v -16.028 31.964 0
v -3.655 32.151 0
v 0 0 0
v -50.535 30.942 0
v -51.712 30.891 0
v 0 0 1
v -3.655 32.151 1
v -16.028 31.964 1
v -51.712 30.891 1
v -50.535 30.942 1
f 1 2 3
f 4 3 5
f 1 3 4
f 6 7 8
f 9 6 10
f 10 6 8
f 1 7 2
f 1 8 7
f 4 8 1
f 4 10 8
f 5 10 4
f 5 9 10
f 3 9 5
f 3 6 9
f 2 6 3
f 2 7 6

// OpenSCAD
// Generated by SolidPython 1.1.3 on 2024-05-19 23:35:49


linear_extrude(height = 1) {
	polygon(points = [[0, 0], [-3.6552031250, 32.1512988281], [-3.7123750000, 32.1504343750], [-3.7695468750, 32.1495699219], [-3.8267187500, 32.1487054688], [-3.8838906250, 32.1478410156], [-3.9410625000, 32.1469765625], [-3.9982343750, 32.1461121094], [-4.0554062500, 32.1452476562], [-4.1125781250, 32.1443832031], [-4.1697500000, 32.1435187500], [-4.2269218750, 32.1426542969], [-4.2840937500, 32.1417898437], [-4.3412656250, 32.1409253906], [-4.3984375000, 32.1400609375], [-4.4556093750, 32.1391964844], [-4.5127812500, 32.1383320313], [-4.5699531250, 32.1374675781], [-4.6271250000, 32.1366031250], [-4.6842968750, 32.1357386719], [-4.7414687500, 32.1348742187], [-4.7986406250, 32.1340097656], [-4.8558125000, 32.1331453125], [-4.9129843750, 32.1322808594], [-4.9701562500, 32.1314164063], [-5.0273281250, 32.1305519531], [-5.0845000000, 32.1296875000], [-5.1416718750, 32.1288230469], [-5.1988437500, 32.1279585938], [-5.2560156250, 32.1270941406], [-5.3131875000, 32.1262296875], [-5.3703593750, 32.1253652344], [-5.4275312500, 32.1245007812], [-5.4847031250, 32.1236363281], [-5.5418750000, 32.1227718750], [-5.5990468750, 32.1219074219], [-5.6562187500, 32.1210429687], [-5.7133906250, 32.1201785156], [-5.7705625000, 32.1193140625], [-5.8277343750, 32.1184496094], [-5.8849062500, 32.1175851563], [-5.9420781250, 32.1167207031], [-5.9992500000, 32.1158562500], [-6.0564218750, 32.1149917969], [-6.1135937500, 32.1141273437], [-6.1707656250, 32.1132628906], [-6.2279375000, 32.1123984375], [-6.2851093750, 32.1115339844], [-6.3422812500, 32.1106695313], [-6.3994531250, 32.1098050781], [-6.4566250000, 32.1089406250], [-6.5137968750, 32.1080761719], [-6.5709687500, 32.1072117188], [-6.6281406250, 32.1063472656], [-6.6853125000, 32.1054828125], [-6.7424843750, 32.1046183594], [-6.7996562500, 32.1037539062], [-6.8568281250, 32.1028894531], [-6.9140000000, 32.1020250000], [-6.9711718750, 32.1011605469], [-7.0283437500, 32.1002960937], [-7.0855156250, 32.0994316406], [-7.1426875000, 32.0985671875], [-7.1998593750, 32.0977027344], [-7.2570312500, 32.0968382813], [-7.3142031250, 32.0959738281], [-7.3713750000, 32.0951093750], [-7.4285468750, 32.0942449219], [-7.4857187500, 32.0933804687], [-7.5428906250, 32.0925160156], [-7.6000625000, 32.0916515625], [-7.6572343750, 32.0907871094], [-7.7144062500, 32.0899226563], [-7.7715781250, 32.0890582031], [-7.8287500000, 32.0881937500], [-7.8859218750, 32.0873292969], [-7.9430937500, 32.0864648438], [-8.0002656250, 32.0856003906], [-8.0574375000, 32.0847359375], [-8.1146093750, 32.0838714844], [-8.1717812500, 32.0830070312], [-8.2289531250, 32.0821425781], [-8.2861250000, 32.0812781250], [-8.3432968750, 32.0804136719], [-8.4004687500, 32.0795492187], [-8.4576406250, 32.0786847656], [-8.5148125000, 32.0778203125], [-8.5719843750, 32.0769558594], [-8.6291562500, 32.0760914063], [-8.6863281250, 32.0752269531], [-8.7435000000, 32.0743625000], [-8.8006718750, 32.0734980469], [-8.8578437500, 32.0726335937], [-8.9150156250, 32.0717691406], [-8.9721875000, 32.0709046875], [-9.0293593750, 32.0700402344], [-9.0865312500, 32.0691757813], [-9.1437031250, 32.0683113281], [-9.2008750000, 32.0674468750], [-9.2580468750, 32.0665824219], [-9.3152187500, 32.0657179688], [-9.3723906250, 32.0648535156], [-9.4295625000, 32.0639890625], [-9.4867343750, 32.0631246094], [-9.5439062500, 32.0622601562], [-9.6010781250, 32.0613957031], [-9.6582500000, 32.0605312500], [-9.7154218750, 32.0596667969], [-9.7725937500, 32.0588023437], [-9.8297656250, 32.0579378906], [-9.8869375000, 32.0570734375], [-9.9441093750, 32.0562089844], [-10.0012812500, 32.0553445313], [-10.0584531250, 32.0544800781], [-10.1156250000, 32.0536156250], [-10.1727968750, 32.0527511719], [-10.2299687500, 32.0518867187], [-10.2871406250, 32.0510222656], [-10.3443125000, 32.0501578125], [-10.4014843750, 32.0492933594], [-10.4586562500, 32.0484289063], [-10.5158281250, 32.0475644531], [-10.5730000000, 32.0467000000], [-10.6582312500, 32.0454109375], [-10.7434625000, 32.0441218750], [-10.8286937500, 32.0428328125], [-10.9139250000, 32.0415437500], [-10.9991562500, 32.0402546875], [-11.0843875000, 32.0389656250], [-11.1696187500, 32.0376765625], [-11.2548500000, 32.0363875000], [-11.3400812500, 32.0350984375], [-11.4253125000, 32.0338093750], [-11.5105437500, 32.0325203125], [-11.5957750000, 32.0312312500], [-11.6810062500, 32.0299421875], [-11.7662375000, 32.0286531250], [-11.8514687500, 32.0273640625], [-11.9367000000, 32.0260750000], [-12.0219312500, 32.0247859375], [-12.1071625000, 32.0234968750], [-12.1923937500, 32.0222078125], [-12.2776250000, 32.0209187500], [-12.3628562500, 32.0196296875], [-12.4480875000, 32.0183406250], [-12.5333187500, 32.0170515625], [-12.6185500000, 32.0157625000], [-12.7037812500, 32.0144734375], [-12.7890125000, 32.0131843750], [-12.8742437500, 32.0118953125], [-12.9594750000, 32.0106062500], [-13.0447062500, 32.0093171875], [-13.1299375000, 32.0080281250], [-13.2151687500, 32.0067390625], [-13.3004000000, 32.0054500000], [-13.3856312500, 32.0041609375], [-13.4708625000, 32.0028718750], [-13.5560937500, 32.0015828125], [-13.6413250000, 32.0002937500], [-13.7265562500, 31.9990046875], [-13.8117875000, 31.9977156250], [-13.8970187500, 31.9964265625], [-13.9822500000, 31.9951375000], [-14.0674812500, 31.9938484375], [-14.1527125000, 31.9925593750], [-14.2379437500, 31.9912703125], [-14.3231750000, 31.9899812500], [-14.4084062500, 31.9886921875], [-14.4936375000, 31.9874031250], [-14.5788687500, 31.9861140625], [-14.6641000000, 31.9848250000], [-14.7493312500, 31.9835359375], [-14.8345625000, 31.9822468750], [-14.9197937500, 31.9809578125], [-15.0050250000, 31.9796687500], [-15.0902562500, 31.9783796875], [-15.1754875000, 31.9770906250], [-15.2607187500, 31.9758015625], [-15.3459500000, 31.9745125000], [-15.4311812500, 31.9732234375], [-15.5164125000, 31.9719343750], [-15.6016437500, 31.9706453125], [-15.6868750000, 31.9693562500], [-15.7721062500, 31.9680671875], [-15.8573375000, 31.9667781250], [-15.9425687500, 31.9654890625], [-16.0278000000, 31.9642000000], [-16.1260382812, 31.9612898438], [-16.2242765625, 31.9583796875], [-16.3225148437, 31.9554695312], [-16.4207531250, 31.9525593750], [-16.5189914062, 31.9496492188], [-16.6172296875, 31.9467390625], [-16.7154679687, 31.9438289063], [-16.8137062500, 31.9409187500], [-16.9119445313, 31.9380085938], [-17.0101828125, 31.9350984375], [-17.1084210937, 31.9321882813], [-17.2066593750, 31.9292781250], [-17.3048976562, 31.9263679688], [-17.4031359375, 31.9234578125], [-17.5013742188, 31.9205476563], [-17.5996125000, 31.9176375000], [-17.6978507812, 31.9147273438], [-17.7960890625, 31.9118171875], [-17.8943273437, 31.9089070313], [-17.9925656250, 31.9059968750], [-18.0908039062, 31.9030867188], [-18.1890421875, 31.9001765625], [-18.2872804687, 31.8972664063], [-18.3855187500, 31.8943562500], [-18.4837570313, 31.8914460938], [-18.5819953125, 31.8885359375], [-18.6802335937, 31.8856257813], [-18.7784718750, 31.8827156250], [-18.8767101562, 31.8798054688], [-18.9749484375, 31.8768953125], [-19.0731867188, 31.8739851563], [-19.1714250000, 31.8710750000], [-19.2696632812, 31.8681648438], [-19.3679015625, 31.8652546875], [-19.4661398437, 31.8623445313], [-19.5643781250, 31.8594343750], [-19.6626164062, 31.8565242188], [-19.7608546875, 31.8536140625], [-19.8590929687, 31.8507039063], [-19.9573312500, 31.8477937500], [-20.0555695313, 31.8448835938], [-20.1538078125, 31.8419734375], [-20.2520460937, 31.8390632813], [-20.3502843750, 31.8361531250], [-20.4485226562, 31.8332429688], [-20.5467609375, 31.8303328125], [-20.6449992188, 31.8274226563], [-20.7432375000, 31.8245125000], [-20.8414757812, 31.8216023438], [-20.9397140625, 31.8186921875], [-21.0379523437, 31.8157820313], [-21.1361906250, 31.8128718750], [-21.2344289062, 31.8099617188], [-21.3326671875, 31.8070515625], [-21.4309054687, 31.8041414063], [-21.5291437500, 31.8012312500], [-21.6273820313, 31.7983210938], [-21.7256203125, 31.7954109375], [-21.8238585937, 31.7925007813], [-21.9220968750, 31.7895906250], [-22.0203351562, 31.7866804688], [-22.1185734375, 31.7837703125], [-22.2168117188, 31.7808601563], [-22.3150500000, 31.7779500000], [-22.4132882812, 31.7750398438], [-22.5115265625, 31.7721296875], [-22.6097648437, 31.7692195313], [-22.7080031250, 31.7663093750], [-22.8062414062, 31.7633992188], [-22.9044796875, 31.7604890625], [-23.0027179687, 31.7575789063], [-23.1009562500, 31.7546687500], [-23.1991945313, 31.7517585938], [-23.2974328125, 31.7488484375], [-23.3956710937, 31.7459382813], [-23.4939093750, 31.7430281250], [-23.5921476562, 31.7401179688], [-23.6903859375, 31.7372078125], [-23.7886242188, 31.7342976563], [-23.8868625000, 31.7313875000], [-23.9851007812, 31.7284773438], [-24.0833390625, 31.7255671875], [-24.1815773437, 31.7226570313], [-24.2798156250, 31.7197468750], [-24.3780539062, 31.7168367188], [-24.4762921875, 31.7139265625], [-24.5745304687, 31.7110164063], [-24.6727687500, 31.7081062500], [-24.7710070313, 31.7051960938], [-24.8692453125, 31.7022859375], [-24.9674835937, 31.6993757813], [-25.0657218750, 31.6964656250], [-25.1639601562, 31.6935554688], [-25.2621984375, 31.6906453125], [-25.3604367188, 31.6877351563], [-25.4586750000, 31.6848250000], [-25.5569132812, 31.6819148438], [-25.6551515625, 31.6790046875], [-25.7533898437, 31.6760945313], [-25.8516281250, 31.6731843750], [-25.9498664062, 31.6702742188], [-26.0481046875, 31.6673640625], [-26.1463429687, 31.6644539063], [-26.2445812500, 31.6615437500], [-26.3428195313, 31.6586335938], [-26.4410578125, 31.6557234375], [-26.5392960937, 31.6528132813], [-26.6375343750, 31.6499031250], [-26.7357726562, 31.6469929688], [-26.8340109375, 31.6440828125], [-26.9322492188, 31.6411726563], [-27.0304875000, 31.6382625000], [-27.1287257812, 31.6353523438], [-27.2269640625, 31.6324421875], [-27.3252023438, 31.6295320313], [-27.4234406250, 31.6266218750], [-27.5216789062, 31.6237117188], [-27.6199171875, 31.6208015625], [-27.7181554687, 31.6178914063], [-27.8163937500, 31.6149812500], [-27.9146320313, 31.6120710938], [-28.0128703125, 31.6091609375], [-28.1111085938, 31.6062507813], [-28.2093468750, 31.6033406250], [-28.3075851562, 31.6004304688], [-28.4058234375, 31.5975203125], [-28.5040617188, 31.5946101563], [-28.6023000000, 31.5917000000], [-28.7005382812, 31.5887898438], [-28.7987765625, 31.5858796875], [-28.8970148438, 31.5829695313], [-28.9952531250, 31.5800593750], [-29.0934914062, 31.5771492188], [-29.1917296875, 31.5742390625], [-29.2899679687, 31.5713289063], [-29.3882062500, 31.5684187500], [-29.4864445313, 31.5655085938], [-29.5846828125, 31.5625984375], [-29.6829210938, 31.5596882813], [-29.7811593750, 31.5567781250], [-29.8793976562, 31.5538679688], [-29.9776359375, 31.5509578125], [-30.0758742188, 31.5480476563], [-30.1741125000, 31.5451375000], [-30.2723507812, 31.5422273438], [-30.3705890625, 31.5393171875], [-30.4688273438, 31.5364070313], [-30.5670656250, 31.5334968750], [-30.6653039062, 31.5305867188], [-30.7635421875, 31.5276765625], [-30.8617804687, 31.5247664063], [-30.9600187500, 31.5218562500], [-31.0582570313, 31.5189460938], [-31.1564953125, 31.5160359375], [-31.2547335938, 31.5131257813], [-31.3529718750, 31.5102156250], [-31.4512101562, 31.5073054688], [-31.5494484375, 31.5043953125], [-31.6476867188, 31.5014851563], [-31.7459250000, 31.4985750000], [-31.8441632812, 31.4956648438], [-31.9424015625, 31.4927546875], [-32.0406398438, 31.4898445313], [-32.1388781250, 31.4869343750], [-32.2371164062, 31.4840242188], [-32.3353546875, 31.4811140625], [-32.4335929687, 31.4782039063], [-32.5318312500, 31.4752937500], [-32.6300695313, 31.4723835938], [-32.7283078125, 31.4694734375], [-32.8265460937, 31.4665632813], [-32.9247843750, 31.4636531250], [-33.0230226562, 31.4607429688], [-33.1212609375, 31.4578328125], [-33.2194992188, 31.4549226563], [-33.3177375000, 31.4520125000], [-33.4159757812, 31.4491023438], [-33.5142140625, 31.4461921875], [-33.6124523438, 31.4432820313], [-33.7106906250, 31.4403718750], [-33.8089289063, 31.4374617188], [-33.9071671875, 31.4345515625], [-34.0054054687, 31.4316414063], [-34.1036437500, 31.4287312500], [-34.2018820313, 31.4258210938], [-34.3001203125, 31.4229109375], [-34.3983585938, 31.4200007812], [-34.4965968750, 31.4170906250], [-34.5948351562, 31.4141804688], [-34.6930734375, 31.4112703125], [-34.7913117188, 31.4083601563], [-34.8895500000, 31.4054500000], [-34.9877882812, 31.4025398438], [-35.0860265625, 31.3996296875], [-35.1842648438, 31.3967195313], [-35.2825031250, 31.3938093750], [-35.3807414062, 31.3908992188], [-35.4789796875, 31.3879890625], [-35.5772179687, 31.3850789063], [-35.6754562500, 31.3821687500], [-35.7736945313, 31.3792585938], [-35.8719328125, 31.3763484375], [-35.9701710937, 31.3734382812], [-36.0684093750, 31.3705281250], [-36.1666476562, 31.3676179688], [-36.2648859375, 31.3647078125], [-36.3631242188, 31.3617976563], [-36.4613625000, 31.3588875000], [-36.5596007812, 31.3559773438], [-36.6578390625, 31.3530671875], [-36.7560773438, 31.3501570313], [-36.8543156250, 31.3472468750], [-36.9525539063, 31.3443367188], [-37.0507921875, 31.3414265625], [-37.1490304687, 31.3385164063], [-37.2472687500, 31.3356062500], [-37.3455070313, 31.3326960938], [-37.4437453125, 31.3297859375], [-37.5419835938, 31.3268757812], [-37.6402218750, 31.3239656250], [-37.7384601562, 31.3210554688], [-37.8366984375, 31.3181453125], [-37.9349367188, 31.3152351563], [-38.0331750000, 31.3123250000], [-38.1314132812, 31.3094148438], [-38.2296515625, 31.3065046875], [-38.3278898438, 31.3035945313], [-38.4261281250, 31.3006843750], [-38.5243664062, 31.2977742188], [-38.6226046875, 31.2948640625], [-38.7208429687, 31.2919539063], [-38.8190812500, 31.2890437500], [-38.9173195313, 31.2861335938], [-39.0155578125, 31.2832234375], [-39.1137960937, 31.2803132812], [-39.2120343750, 31.2774031250], [-39.3102726562, 31.2744929687], [-39.4085109375, 31.2715828125], [-39.5067492188, 31.2686726563], [-39.6049875000, 31.2657625000], [-39.7032257812, 31.2628523438], [-39.8014640625, 31.2599421875], [-39.8997023438, 31.2570320313], [-39.9979406250, 31.2541218750], [-40.0961789063, 31.2512117188], [-40.1944171875, 31.2483015625], [-40.2926554687, 31.2453914063], [-40.3908937500, 31.2424812500], [-40.4891320313, 31.2395710938], [-40.5873703125, 31.2366609375], [-40.6856085938, 31.2337507812], [-40.7838468750, 31.2308406250], [-40.8820851562, 31.2279304687], [-40.9803234375, 31.2250203125], [-41.0785617188, 31.2221101563], [-41.1768000000, 31.2192000000], [-41.2499085937, 31.2170335938], [-41.3230171875, 31.2148671875], [-41.3961257812, 31.2127007812], [-41.4692343750, 31.2105343750], [-41.5423429687, 31.2083679688], [-41.6154515625, 31.2062015625], [-41.6885601562, 31.2040351563], [-41.7616687500, 31.2018687500], [-41.8347773437, 31.1997023438], [-41.9078859375, 31.1975359375], [-41.9809945312, 31.1953695313], [-42.0541031250, 31.1932031250], [-42.1272117187, 31.1910367188], [-42.2003203125, 31.1888703125], [-42.2734289062, 31.1867039063], [-42.3465375000, 31.1845375000], [-42.4196460937, 31.1823710937], [-42.4927546875, 31.1802046875], [-42.5658632812, 31.1780382813], [-42.6389718750, 31.1758718750], [-42.7120804687, 31.1737054688], [-42.7851890625, 31.1715390625], [-42.8582976562, 31.1693726562], [-42.9314062500, 31.1672062500], [-43.0045148437, 31.1650398438], [-43.0776234375, 31.1628734375], [-43.1507320312, 31.1607070312], [-43.2238406250, 31.1585406250], [-43.2969492187, 31.1563742188], [-43.3700578125, 31.1542078125], [-43.4431664063, 31.1520414062], [-43.5162750000, 31.1498750000], [-43.5893835938, 31.1477085938], [-43.6624921875, 31.1455421875], [-43.7356007813, 31.1433757813], [-43.8087093750, 31.1412093750], [-43.8818179688, 31.1390429688], [-43.9549265625, 31.1368765625], [-44.0280351563, 31.1347101563], [-44.1011437500, 31.1325437500], [-44.1742523438, 31.1303773438], [-44.2473609375, 31.1282109375], [-44.3204695313, 31.1260445313], [-44.3935781250, 31.1238781250], [-44.4666867188, 31.1217117188], [-44.5397953125, 31.1195453125], [-44.6129039063, 31.1173789063], [-44.6860125000, 31.1152125000], [-44.7591210938, 31.1130460938], [-44.8322296875, 31.1108796875], [-44.9053382813, 31.1087132813], [-44.9784468750, 31.1065468750], [-45.0515554688, 31.1043804688], [-45.1246640625, 31.1022140625], [-45.1977726563, 31.1000476562], [-45.2708812500, 31.0978812500], [-45.3439898438, 31.0957148438], [-45.4170984375, 31.0935484375], [-45.4902070313, 31.0913820312], [-45.5633156250, 31.0892156250], [-45.6364242188, 31.0870492188], [-45.7095328125, 31.0848828125], [-45.7826414063, 31.0827164063], [-45.8557500000, 31.0805500000], [-45.9288585938, 31.0783835938], [-46.0019671875, 31.0762171875], [-46.0750757812, 31.0740507813], [-46.1481843750, 31.0718843750], [-46.2212929687, 31.0697179688], [-46.2944015625, 31.0675515625], [-46.3675101562, 31.0653851563], [-46.4406187500, 31.0632187500], [-46.5137273437, 31.0610523438], [-46.5868359375, 31.0588859375], [-46.6599445312, 31.0567195313], [-46.7330531250, 31.0545531250], [-46.8061617187, 31.0523867188], [-46.8792703125, 31.0502203125], [-46.9523789062, 31.0480539063], [-47.0254875000, 31.0458875000], [-47.0985960937, 31.0437210938], [-47.1717046875, 31.0415546875], [-47.2448132812, 31.0393882813], [-47.3179218750, 31.0372218750], [-47.3910304687, 31.0350554688], [-47.4641390625, 31.0328890625], [-47.5372476562, 31.0307226562], [-47.6103562500, 31.0285562500], [-47.6834648437, 31.0263898438], [-47.7565734375, 31.0242234375], [-47.8296820312, 31.0220570313], [-47.9027906250, 31.0198906250], [-47.9758992187, 31.0177242188], [-48.0490078125, 31.0155578125], [-48.1221164063, 31.0133914063], [-48.1952250000, 31.0112250000], [-48.2683335938, 31.0090585938], [-48.3414421875, 31.0068921875], [-48.4145507813, 31.0047257813], [-48.4876593750, 31.0025593750], [-48.5607679688, 31.0003929688], [-48.6338765625, 30.9982265625], [-48.7069851563, 30.9960601563], [-48.7800937500, 30.9938937500], [-48.8532023438, 30.9917273438], [-48.9263109375, 30.9895609375], [-48.9994195313, 30.9873945313], [-49.0725281250, 30.9852281250], [-49.1456367188, 30.9830617188], [-49.2187453125, 30.9808953125], [-49.2918539063, 30.9787289062], [-49.3649625000, 30.9765625000], [-49.4380710938, 30.9743960938], [-49.5111796875, 30.9722296875], [-49.5842882813, 30.9700632812], [-49.6573968750, 30.9678968750], [-49.7305054688, 30.9657304688], [-49.8036140625, 30.9635640625], [-49.8767226563, 30.9613976562], [-49.9498312500, 30.9592312500], [-50.0229398438, 30.9570648438], [-50.0960484375, 30.9548984375], [-50.1691570313, 30.9527320313], [-50.2422656250, 30.9505656250], [-50.3153742188, 30.9483992188], [-50.3884828125, 30.9462328125], [-50.4615914063, 30.9440664063], [-50.5347000000, 30.9419000000], [-50.6328343750, 30.9376203125], [-50.7309687500, 30.9333406250], [-50.8291031250, 30.9290609375], [-50.9272375000, 30.9247812500], [-51.0253718750, 30.9205015625], [-51.1235062500, 30.9162218750], [-51.2216406250, 30.9119421875], [-51.3197750000, 30.9076625000], [-51.4179093750, 30.9033828125], [-51.5160437500, 30.8991031250], [-51.6141781250, 30.8948234375], [-51.7123125000, 30.8905437500]]);
}
/***********************************************
*********      SolidPython code:      **********
************************************************
 
import math
import time

from stl import mesh, Dimension

from tkinter import Tk     # from tkinter import Tk for Python 3.x
from tkinter.filedialog import askopenfilename
from mpl_toolkits.mplot3d import art3d
from matplotlib import pyplot as plt
import solid
import os
import ezdxf
import shapely.geometry as sg
import subprocess
from GUI import getSCADPath



def outputSTL(From, To, PATH=getSCADPath()):
    subprocess.Popen(PATH + " -o " + To + " " + From)
    while not os.path.exists(To):
        time.sleep(1)


def get_size(i):
    x_list = [int(a) for a in str(i)]
    return len(x_list)



class Model:
    def __init__(self, model, fileName, location, layer, thickness):
        self.location = location
        self.code = None
        self.fileName = fileName
        self.stl = fileName + ".stl"
        self.layer = layer
        self.thickness = thickness
        self.maxz = (layer+1)*thickness
        self.dxf = fileName + ".dxf"
        self.scad = fileName + ".scad"
        self.model = model
        self.center = None
        self.width = 10
        self.mesh = None
        self.useable_area = None


    def get_code(self):
        max_dim = 0.05
        max_array = 6

        num = int(self.fileName)
        nums = [int(a) for a in str(num)]
        nums.reverse()
        indices = nums
        length = len(nums)

        print(indices)
        t = 0
        i = 0
        cubes = []
        x = 0
        y = 0
        width = 0.01
        while x <= max_dim:
            while y <= max_dim:
                print(indices)
                if nums == []:
                    break
                if indices[0] != 0:
                    cubes.append(solid.translate([x, y, 0])(solid.cube(size=t / 1000 + 0.001)))
                    y += max_dim / (max_array - 1)
                    nums[0] = nums[0] - 1
                else:
                    indices.pop(0)
                    t += 1
                i += 1
            x += max_dim / (max_array - 1)
            y = 0

        outside = solid.translate([-width / 2, -width / 2])(solid.cube(max_dim + (length - 1) / 1000 + 0.001 + width))
        self.code = solid.difference()(outside, cubes)
        self.code = solid.projection(cut=True)(self.code)
        solid.scad_render_to_file(self.code, self.location + "/code.scad")
        outputSTL(From=self.location+"/code.scad", To=self.location+"code.dxf", PATH=getSCADPath())
        # os.system("toSTL.sh renders/code.scad renders/code.dxf")
        return self.location+"/code.dxf"

    def download(self, type):
        if type =="stl":
            print("generating:" + self.location+"/"+ self.fileName+".stl")
            outputSTL(From=self.location+"/"+self.fileName+".scad", To=self.location+"/"+self.fileName+".stl")
            # os.system("toSTL.sh renders/"+ self.fileName+".scad renders/"+ self.fileName+".stl")
        elif type == "dxf":
            outputSTL(From=self.location+"/"+self.fileName+".scad", To=self.location+"/"+self.fileName+".dxf")
            # os.system("toSTL.sh renders/"+ self.fileName+".scad renders/"+ self.fileName+".dxf")

    def render(self):
        solid.scad_render_to_file(self.model, self.location+"/"+ self.fileName+'.scad')
        while not os.path.exists(self.location+"/"+self.fileName+".scad"):
            time.sleep(1)

    def get_points(self):
        doc = ezdxf.readfile(filename=self.location+"/"+ self.fileName+".dxf")
        msp = doc.modelspace()
        i=0
        lists = []
        def helper(e):
            start = [e.dxf.start[0], e.dxf.start[1]]
            end = [e.dxf.end[0], e.dxf.end[1]]
            return [start, end]

        for e in msp.query("LINE"):
            line = helper(e)
            if not lists:
                lists.append([line])
            else:
                if lists[i][len(lists)-1][1] != line[0]:
                    lists.append([line])
                    i+=1
                else:
                    lists[i].append(line)

    def get_points2(self, FILE):
        doc = ezdxf.readfile(filename=FILE)
        msp = doc.modelspace()
        i = 0
        lists = []

        def helper(e):
            start = [e.dxf.start[0], e.dxf.start[1]]
            end = [e.dxf.end[0], e.dxf.end[1]]
            return (start, end)

        for e in msp.query("LINE"):
            line = helper(e)
            if lists==[]:
                lists.append([line])
            else:
                if lists[i][len(lists[i]) - 1][1] != line[0]:
                    lists.append([line])
                    i += 1
                else:
                    lists[i].append(line)
        return lists

    def add_code(self):
        dxf = solid.projection(cut=False)(self.model)
        offset = solid.offset(r=-0.1)(dxf)
        solid.scad_render_to_file(offset, self.location+'/offset.scad')
        os.system("toSTL.sh renders/offset.scad renders/offset.dxf")
        lines = self.get_points2("renders/offset.dxf")
        x = lines[0][0][0][0]
        y = lines[0][0][0][1]
        print(x)
        print(y)
        code = solid.translate([x,y,0])(self.code)
        code = solid.linear_extrude(height=999)(code)
        save = self.model
        self.model = solid.projection()(solid.difference()(self.model, code))
        self.render()
        self.download("dxf")
        self.model = save

    def add_label(self, pos):
        # num = 12
        # minx, maxx, miny, maxy, minz, maxz = self.find_minmax()
        maxz = self.maxz
        # label = solid.linear_extrude(height=(maxz-minz)/3)(solid.text(str(self.fileName), size=0.5, halign="center"))
        # i=minx
        # print("x-len: " + str(maxx-minx))
        # print(i)
        # inc = (maxx-minx)/num
        # while minx <= i <= maxx:
        #     label = solid.union()(solid.translate([i, 0, maxz - 0.2])(solid.linear_extrude(height=(maxz-minz)/3)(solid.text(str(self.fileName), size=0.25, halign="center"))), label)
        #     i += inc
        #
        # l = label
        #
        # i =miny
        # while miny<= i <= maxy:
        #     print("y inc")
        #     l = solid.union()(solid.translate([0, i, 0])(label), l)
        #     i += 0.5
        for i in str(self.fileName):
            cur = pos[0]
            label = solid.translate([pos[0][0], pos[0][1], self.maxz-0.2])(solid.linear_extrude(height=(self.thickness)/3)(solid.text(str(i), size=0.5, halign="center", valign="center")))
            self.model = solid.difference()(self.model, label)
            pos.append(pos.pop(0))
            while abs(cur[0]-pos[0][0])<0.5 and abs(cur[1]-pos[0][1])<0.5:
                pos.append(pos.pop(0))



    def Center(self):

        volume, cog, inertia = self.mesh.get_mass_properties()
        print("Volume                                  = {0}".format(volume))
        print("Position of the center of gravity (COG) = {0}".format(cog))
        m_centered = solid.translate([-cog[0], -cog[1], 0])(
            self.model
        )
        return m_centered

    def find_minmax(self):
        minx = maxx = miny = maxy = minz = maxz = None
        for p in self.mesh.points:
            # p contains (x, y, z)
            if minx is None:
                minx = p[Dimension.X]
                maxx = p[Dimension.X]
                miny = p[Dimension.Y]
                maxy = p[Dimension.Y]
                minz = p[Dimension.Z]
                maxz = p[Dimension.Z]
            else:
                maxx = max(p[Dimension.X], maxx)
                minx = min(p[Dimension.X], minx)
                maxy = max(p[Dimension.Y], maxy)
                miny = min(p[Dimension.Y], miny)
                maxz = max(p[Dimension.Z], maxz)
                minz = min(p[Dimension.Z], minz)
        lenx = maxx - minx
        leny = maxy - miny
        lenz = maxz - minz
        return minx, maxx, miny, maxy, minz, maxz

    # def generate_Mesh(self):
    #     self.mesh = mesh.Mesh.from_file(self.location + "/" + str(int(self.fileName)//8)+ "b.stl")

    def get_top(self):
        top = solid.projection(cut=True)(solid.translate([0,0,-1*self.thickness*(self.layer+1)])(self.model))
        useable_area = solid.offset(r=-0.45)(top)
        self.useable_area = useable_area
        solid.scad_render_to_file(self.useable_area, self.location+'/' + 'toptemp.scad')
        outputSTL(From=self.location+'/' + 'toptemp.scad', To=self.location+"/top"+ self.dxf)

        # os.system("toSTL.sh out/toptemp.scad renders/" + self.fileName + ".dxf")
        dxf = DXF(self.location+"/top"+ self.dxf)
        min_p=dxf.points[0][0]
        points_ordered = dxf.points
        i=0
        while i <= len(dxf.points)+1:
            while math.sqrt((dxf.points[0][0]-dxf.points[1][0])**2+(dxf.points[0][1]-dxf.points[1][1])**2) > 0.1:
                dxf.points.insert(1, [(dxf.points[0][0]+dxf.points[1][0])/2, (dxf.points[0][1]+dxf.points[1][1])/2])
                i = i-1
            dxf.points.append(dxf.points.pop(0))
            i+=1
        for i in range(len(dxf.points)):
            dxf.points.append(dxf.points.pop(0))
            if dxf.points[0][0] < min_p:
                min_p = dxf.points[0][0]
                points_ordered = dxf.points.copy()
        dxf.points = points_ordered.copy()

        print(dxf.points)
        self.add_label(dxf.points)

class DXF:
    def __init__(self, file):
        self.file = file
        self.Lines = []
        self.points = []
        doc = ezdxf.readfile(self.file)
        msp = doc.modelspace()
        for e in msp:
            if e.dxftype() == "LINE":
                self.Lines.append(e)
                self.points.append([e.dxf.start[0], e.dxf.start[1]])
        # self.points.append([self.Lines[-1].dxf.end[0], self.Lines[-1].dxf.end[1]])
        self.area = None
        self.center = None
        self.polygon = sg.Polygon(self.points)

    def get_area(self):
        self.area = self.polygon.area
        return self.area

    def get_center(self):
        x_sum = 0
        y_sum =0
        for i in self.points:
            x_sum += i[0]
            y_sum += i[1]
        x_c = x_sum/len(self.points)
        y_c = y_sum/len(self.points)
        return (x_c, y_c)

    def split(self, maxdim):
        splits = []
        length = 0
        pieces = [[]]
        prev = self.points[0]
        for j in self.points:
            length = length + math.sqrt((prev[0]-j[0])**2+(prev[1]-j[1])**2)
            if length >= maxdim:
                pieces[-1].append(j)
                pieces.append([])
                length = 0
            pieces[-1].append(j)
            prev = j
        for j in pieces:
            j.insert(0, [0,0])
            piece = solid.linear_extrude(height=1)(solid.polygon(j))
            splits.append(piece)
        return splits
    def refine_points(self):
        i=0
        while i <= len(self.points)+1:
            while math.sqrt((self.points[0][0]-self.points[1][0])**2+(self.points[0][1]-self.points[1][1])**2) > 0.1:
                self.points.insert(1, [(self.points[0][0]+self.points[1][0])/2, (self.points[0][1]+self.points[1][1])/2])
                i = i-1
            self.points.append(self.points.pop(0))
            i+=1


if __name__== "__main__":
    test = DXF("C:/Users/Daniel/Documents/repos/Shell_Maker/output/0top_slice.dxf")
    test.refine_points()
    k = test.split(48)
    for i in range(len(k)):
        solid.scad_render_to_file(k[i], str(i) + ".scad")


 
 
************************************************/
